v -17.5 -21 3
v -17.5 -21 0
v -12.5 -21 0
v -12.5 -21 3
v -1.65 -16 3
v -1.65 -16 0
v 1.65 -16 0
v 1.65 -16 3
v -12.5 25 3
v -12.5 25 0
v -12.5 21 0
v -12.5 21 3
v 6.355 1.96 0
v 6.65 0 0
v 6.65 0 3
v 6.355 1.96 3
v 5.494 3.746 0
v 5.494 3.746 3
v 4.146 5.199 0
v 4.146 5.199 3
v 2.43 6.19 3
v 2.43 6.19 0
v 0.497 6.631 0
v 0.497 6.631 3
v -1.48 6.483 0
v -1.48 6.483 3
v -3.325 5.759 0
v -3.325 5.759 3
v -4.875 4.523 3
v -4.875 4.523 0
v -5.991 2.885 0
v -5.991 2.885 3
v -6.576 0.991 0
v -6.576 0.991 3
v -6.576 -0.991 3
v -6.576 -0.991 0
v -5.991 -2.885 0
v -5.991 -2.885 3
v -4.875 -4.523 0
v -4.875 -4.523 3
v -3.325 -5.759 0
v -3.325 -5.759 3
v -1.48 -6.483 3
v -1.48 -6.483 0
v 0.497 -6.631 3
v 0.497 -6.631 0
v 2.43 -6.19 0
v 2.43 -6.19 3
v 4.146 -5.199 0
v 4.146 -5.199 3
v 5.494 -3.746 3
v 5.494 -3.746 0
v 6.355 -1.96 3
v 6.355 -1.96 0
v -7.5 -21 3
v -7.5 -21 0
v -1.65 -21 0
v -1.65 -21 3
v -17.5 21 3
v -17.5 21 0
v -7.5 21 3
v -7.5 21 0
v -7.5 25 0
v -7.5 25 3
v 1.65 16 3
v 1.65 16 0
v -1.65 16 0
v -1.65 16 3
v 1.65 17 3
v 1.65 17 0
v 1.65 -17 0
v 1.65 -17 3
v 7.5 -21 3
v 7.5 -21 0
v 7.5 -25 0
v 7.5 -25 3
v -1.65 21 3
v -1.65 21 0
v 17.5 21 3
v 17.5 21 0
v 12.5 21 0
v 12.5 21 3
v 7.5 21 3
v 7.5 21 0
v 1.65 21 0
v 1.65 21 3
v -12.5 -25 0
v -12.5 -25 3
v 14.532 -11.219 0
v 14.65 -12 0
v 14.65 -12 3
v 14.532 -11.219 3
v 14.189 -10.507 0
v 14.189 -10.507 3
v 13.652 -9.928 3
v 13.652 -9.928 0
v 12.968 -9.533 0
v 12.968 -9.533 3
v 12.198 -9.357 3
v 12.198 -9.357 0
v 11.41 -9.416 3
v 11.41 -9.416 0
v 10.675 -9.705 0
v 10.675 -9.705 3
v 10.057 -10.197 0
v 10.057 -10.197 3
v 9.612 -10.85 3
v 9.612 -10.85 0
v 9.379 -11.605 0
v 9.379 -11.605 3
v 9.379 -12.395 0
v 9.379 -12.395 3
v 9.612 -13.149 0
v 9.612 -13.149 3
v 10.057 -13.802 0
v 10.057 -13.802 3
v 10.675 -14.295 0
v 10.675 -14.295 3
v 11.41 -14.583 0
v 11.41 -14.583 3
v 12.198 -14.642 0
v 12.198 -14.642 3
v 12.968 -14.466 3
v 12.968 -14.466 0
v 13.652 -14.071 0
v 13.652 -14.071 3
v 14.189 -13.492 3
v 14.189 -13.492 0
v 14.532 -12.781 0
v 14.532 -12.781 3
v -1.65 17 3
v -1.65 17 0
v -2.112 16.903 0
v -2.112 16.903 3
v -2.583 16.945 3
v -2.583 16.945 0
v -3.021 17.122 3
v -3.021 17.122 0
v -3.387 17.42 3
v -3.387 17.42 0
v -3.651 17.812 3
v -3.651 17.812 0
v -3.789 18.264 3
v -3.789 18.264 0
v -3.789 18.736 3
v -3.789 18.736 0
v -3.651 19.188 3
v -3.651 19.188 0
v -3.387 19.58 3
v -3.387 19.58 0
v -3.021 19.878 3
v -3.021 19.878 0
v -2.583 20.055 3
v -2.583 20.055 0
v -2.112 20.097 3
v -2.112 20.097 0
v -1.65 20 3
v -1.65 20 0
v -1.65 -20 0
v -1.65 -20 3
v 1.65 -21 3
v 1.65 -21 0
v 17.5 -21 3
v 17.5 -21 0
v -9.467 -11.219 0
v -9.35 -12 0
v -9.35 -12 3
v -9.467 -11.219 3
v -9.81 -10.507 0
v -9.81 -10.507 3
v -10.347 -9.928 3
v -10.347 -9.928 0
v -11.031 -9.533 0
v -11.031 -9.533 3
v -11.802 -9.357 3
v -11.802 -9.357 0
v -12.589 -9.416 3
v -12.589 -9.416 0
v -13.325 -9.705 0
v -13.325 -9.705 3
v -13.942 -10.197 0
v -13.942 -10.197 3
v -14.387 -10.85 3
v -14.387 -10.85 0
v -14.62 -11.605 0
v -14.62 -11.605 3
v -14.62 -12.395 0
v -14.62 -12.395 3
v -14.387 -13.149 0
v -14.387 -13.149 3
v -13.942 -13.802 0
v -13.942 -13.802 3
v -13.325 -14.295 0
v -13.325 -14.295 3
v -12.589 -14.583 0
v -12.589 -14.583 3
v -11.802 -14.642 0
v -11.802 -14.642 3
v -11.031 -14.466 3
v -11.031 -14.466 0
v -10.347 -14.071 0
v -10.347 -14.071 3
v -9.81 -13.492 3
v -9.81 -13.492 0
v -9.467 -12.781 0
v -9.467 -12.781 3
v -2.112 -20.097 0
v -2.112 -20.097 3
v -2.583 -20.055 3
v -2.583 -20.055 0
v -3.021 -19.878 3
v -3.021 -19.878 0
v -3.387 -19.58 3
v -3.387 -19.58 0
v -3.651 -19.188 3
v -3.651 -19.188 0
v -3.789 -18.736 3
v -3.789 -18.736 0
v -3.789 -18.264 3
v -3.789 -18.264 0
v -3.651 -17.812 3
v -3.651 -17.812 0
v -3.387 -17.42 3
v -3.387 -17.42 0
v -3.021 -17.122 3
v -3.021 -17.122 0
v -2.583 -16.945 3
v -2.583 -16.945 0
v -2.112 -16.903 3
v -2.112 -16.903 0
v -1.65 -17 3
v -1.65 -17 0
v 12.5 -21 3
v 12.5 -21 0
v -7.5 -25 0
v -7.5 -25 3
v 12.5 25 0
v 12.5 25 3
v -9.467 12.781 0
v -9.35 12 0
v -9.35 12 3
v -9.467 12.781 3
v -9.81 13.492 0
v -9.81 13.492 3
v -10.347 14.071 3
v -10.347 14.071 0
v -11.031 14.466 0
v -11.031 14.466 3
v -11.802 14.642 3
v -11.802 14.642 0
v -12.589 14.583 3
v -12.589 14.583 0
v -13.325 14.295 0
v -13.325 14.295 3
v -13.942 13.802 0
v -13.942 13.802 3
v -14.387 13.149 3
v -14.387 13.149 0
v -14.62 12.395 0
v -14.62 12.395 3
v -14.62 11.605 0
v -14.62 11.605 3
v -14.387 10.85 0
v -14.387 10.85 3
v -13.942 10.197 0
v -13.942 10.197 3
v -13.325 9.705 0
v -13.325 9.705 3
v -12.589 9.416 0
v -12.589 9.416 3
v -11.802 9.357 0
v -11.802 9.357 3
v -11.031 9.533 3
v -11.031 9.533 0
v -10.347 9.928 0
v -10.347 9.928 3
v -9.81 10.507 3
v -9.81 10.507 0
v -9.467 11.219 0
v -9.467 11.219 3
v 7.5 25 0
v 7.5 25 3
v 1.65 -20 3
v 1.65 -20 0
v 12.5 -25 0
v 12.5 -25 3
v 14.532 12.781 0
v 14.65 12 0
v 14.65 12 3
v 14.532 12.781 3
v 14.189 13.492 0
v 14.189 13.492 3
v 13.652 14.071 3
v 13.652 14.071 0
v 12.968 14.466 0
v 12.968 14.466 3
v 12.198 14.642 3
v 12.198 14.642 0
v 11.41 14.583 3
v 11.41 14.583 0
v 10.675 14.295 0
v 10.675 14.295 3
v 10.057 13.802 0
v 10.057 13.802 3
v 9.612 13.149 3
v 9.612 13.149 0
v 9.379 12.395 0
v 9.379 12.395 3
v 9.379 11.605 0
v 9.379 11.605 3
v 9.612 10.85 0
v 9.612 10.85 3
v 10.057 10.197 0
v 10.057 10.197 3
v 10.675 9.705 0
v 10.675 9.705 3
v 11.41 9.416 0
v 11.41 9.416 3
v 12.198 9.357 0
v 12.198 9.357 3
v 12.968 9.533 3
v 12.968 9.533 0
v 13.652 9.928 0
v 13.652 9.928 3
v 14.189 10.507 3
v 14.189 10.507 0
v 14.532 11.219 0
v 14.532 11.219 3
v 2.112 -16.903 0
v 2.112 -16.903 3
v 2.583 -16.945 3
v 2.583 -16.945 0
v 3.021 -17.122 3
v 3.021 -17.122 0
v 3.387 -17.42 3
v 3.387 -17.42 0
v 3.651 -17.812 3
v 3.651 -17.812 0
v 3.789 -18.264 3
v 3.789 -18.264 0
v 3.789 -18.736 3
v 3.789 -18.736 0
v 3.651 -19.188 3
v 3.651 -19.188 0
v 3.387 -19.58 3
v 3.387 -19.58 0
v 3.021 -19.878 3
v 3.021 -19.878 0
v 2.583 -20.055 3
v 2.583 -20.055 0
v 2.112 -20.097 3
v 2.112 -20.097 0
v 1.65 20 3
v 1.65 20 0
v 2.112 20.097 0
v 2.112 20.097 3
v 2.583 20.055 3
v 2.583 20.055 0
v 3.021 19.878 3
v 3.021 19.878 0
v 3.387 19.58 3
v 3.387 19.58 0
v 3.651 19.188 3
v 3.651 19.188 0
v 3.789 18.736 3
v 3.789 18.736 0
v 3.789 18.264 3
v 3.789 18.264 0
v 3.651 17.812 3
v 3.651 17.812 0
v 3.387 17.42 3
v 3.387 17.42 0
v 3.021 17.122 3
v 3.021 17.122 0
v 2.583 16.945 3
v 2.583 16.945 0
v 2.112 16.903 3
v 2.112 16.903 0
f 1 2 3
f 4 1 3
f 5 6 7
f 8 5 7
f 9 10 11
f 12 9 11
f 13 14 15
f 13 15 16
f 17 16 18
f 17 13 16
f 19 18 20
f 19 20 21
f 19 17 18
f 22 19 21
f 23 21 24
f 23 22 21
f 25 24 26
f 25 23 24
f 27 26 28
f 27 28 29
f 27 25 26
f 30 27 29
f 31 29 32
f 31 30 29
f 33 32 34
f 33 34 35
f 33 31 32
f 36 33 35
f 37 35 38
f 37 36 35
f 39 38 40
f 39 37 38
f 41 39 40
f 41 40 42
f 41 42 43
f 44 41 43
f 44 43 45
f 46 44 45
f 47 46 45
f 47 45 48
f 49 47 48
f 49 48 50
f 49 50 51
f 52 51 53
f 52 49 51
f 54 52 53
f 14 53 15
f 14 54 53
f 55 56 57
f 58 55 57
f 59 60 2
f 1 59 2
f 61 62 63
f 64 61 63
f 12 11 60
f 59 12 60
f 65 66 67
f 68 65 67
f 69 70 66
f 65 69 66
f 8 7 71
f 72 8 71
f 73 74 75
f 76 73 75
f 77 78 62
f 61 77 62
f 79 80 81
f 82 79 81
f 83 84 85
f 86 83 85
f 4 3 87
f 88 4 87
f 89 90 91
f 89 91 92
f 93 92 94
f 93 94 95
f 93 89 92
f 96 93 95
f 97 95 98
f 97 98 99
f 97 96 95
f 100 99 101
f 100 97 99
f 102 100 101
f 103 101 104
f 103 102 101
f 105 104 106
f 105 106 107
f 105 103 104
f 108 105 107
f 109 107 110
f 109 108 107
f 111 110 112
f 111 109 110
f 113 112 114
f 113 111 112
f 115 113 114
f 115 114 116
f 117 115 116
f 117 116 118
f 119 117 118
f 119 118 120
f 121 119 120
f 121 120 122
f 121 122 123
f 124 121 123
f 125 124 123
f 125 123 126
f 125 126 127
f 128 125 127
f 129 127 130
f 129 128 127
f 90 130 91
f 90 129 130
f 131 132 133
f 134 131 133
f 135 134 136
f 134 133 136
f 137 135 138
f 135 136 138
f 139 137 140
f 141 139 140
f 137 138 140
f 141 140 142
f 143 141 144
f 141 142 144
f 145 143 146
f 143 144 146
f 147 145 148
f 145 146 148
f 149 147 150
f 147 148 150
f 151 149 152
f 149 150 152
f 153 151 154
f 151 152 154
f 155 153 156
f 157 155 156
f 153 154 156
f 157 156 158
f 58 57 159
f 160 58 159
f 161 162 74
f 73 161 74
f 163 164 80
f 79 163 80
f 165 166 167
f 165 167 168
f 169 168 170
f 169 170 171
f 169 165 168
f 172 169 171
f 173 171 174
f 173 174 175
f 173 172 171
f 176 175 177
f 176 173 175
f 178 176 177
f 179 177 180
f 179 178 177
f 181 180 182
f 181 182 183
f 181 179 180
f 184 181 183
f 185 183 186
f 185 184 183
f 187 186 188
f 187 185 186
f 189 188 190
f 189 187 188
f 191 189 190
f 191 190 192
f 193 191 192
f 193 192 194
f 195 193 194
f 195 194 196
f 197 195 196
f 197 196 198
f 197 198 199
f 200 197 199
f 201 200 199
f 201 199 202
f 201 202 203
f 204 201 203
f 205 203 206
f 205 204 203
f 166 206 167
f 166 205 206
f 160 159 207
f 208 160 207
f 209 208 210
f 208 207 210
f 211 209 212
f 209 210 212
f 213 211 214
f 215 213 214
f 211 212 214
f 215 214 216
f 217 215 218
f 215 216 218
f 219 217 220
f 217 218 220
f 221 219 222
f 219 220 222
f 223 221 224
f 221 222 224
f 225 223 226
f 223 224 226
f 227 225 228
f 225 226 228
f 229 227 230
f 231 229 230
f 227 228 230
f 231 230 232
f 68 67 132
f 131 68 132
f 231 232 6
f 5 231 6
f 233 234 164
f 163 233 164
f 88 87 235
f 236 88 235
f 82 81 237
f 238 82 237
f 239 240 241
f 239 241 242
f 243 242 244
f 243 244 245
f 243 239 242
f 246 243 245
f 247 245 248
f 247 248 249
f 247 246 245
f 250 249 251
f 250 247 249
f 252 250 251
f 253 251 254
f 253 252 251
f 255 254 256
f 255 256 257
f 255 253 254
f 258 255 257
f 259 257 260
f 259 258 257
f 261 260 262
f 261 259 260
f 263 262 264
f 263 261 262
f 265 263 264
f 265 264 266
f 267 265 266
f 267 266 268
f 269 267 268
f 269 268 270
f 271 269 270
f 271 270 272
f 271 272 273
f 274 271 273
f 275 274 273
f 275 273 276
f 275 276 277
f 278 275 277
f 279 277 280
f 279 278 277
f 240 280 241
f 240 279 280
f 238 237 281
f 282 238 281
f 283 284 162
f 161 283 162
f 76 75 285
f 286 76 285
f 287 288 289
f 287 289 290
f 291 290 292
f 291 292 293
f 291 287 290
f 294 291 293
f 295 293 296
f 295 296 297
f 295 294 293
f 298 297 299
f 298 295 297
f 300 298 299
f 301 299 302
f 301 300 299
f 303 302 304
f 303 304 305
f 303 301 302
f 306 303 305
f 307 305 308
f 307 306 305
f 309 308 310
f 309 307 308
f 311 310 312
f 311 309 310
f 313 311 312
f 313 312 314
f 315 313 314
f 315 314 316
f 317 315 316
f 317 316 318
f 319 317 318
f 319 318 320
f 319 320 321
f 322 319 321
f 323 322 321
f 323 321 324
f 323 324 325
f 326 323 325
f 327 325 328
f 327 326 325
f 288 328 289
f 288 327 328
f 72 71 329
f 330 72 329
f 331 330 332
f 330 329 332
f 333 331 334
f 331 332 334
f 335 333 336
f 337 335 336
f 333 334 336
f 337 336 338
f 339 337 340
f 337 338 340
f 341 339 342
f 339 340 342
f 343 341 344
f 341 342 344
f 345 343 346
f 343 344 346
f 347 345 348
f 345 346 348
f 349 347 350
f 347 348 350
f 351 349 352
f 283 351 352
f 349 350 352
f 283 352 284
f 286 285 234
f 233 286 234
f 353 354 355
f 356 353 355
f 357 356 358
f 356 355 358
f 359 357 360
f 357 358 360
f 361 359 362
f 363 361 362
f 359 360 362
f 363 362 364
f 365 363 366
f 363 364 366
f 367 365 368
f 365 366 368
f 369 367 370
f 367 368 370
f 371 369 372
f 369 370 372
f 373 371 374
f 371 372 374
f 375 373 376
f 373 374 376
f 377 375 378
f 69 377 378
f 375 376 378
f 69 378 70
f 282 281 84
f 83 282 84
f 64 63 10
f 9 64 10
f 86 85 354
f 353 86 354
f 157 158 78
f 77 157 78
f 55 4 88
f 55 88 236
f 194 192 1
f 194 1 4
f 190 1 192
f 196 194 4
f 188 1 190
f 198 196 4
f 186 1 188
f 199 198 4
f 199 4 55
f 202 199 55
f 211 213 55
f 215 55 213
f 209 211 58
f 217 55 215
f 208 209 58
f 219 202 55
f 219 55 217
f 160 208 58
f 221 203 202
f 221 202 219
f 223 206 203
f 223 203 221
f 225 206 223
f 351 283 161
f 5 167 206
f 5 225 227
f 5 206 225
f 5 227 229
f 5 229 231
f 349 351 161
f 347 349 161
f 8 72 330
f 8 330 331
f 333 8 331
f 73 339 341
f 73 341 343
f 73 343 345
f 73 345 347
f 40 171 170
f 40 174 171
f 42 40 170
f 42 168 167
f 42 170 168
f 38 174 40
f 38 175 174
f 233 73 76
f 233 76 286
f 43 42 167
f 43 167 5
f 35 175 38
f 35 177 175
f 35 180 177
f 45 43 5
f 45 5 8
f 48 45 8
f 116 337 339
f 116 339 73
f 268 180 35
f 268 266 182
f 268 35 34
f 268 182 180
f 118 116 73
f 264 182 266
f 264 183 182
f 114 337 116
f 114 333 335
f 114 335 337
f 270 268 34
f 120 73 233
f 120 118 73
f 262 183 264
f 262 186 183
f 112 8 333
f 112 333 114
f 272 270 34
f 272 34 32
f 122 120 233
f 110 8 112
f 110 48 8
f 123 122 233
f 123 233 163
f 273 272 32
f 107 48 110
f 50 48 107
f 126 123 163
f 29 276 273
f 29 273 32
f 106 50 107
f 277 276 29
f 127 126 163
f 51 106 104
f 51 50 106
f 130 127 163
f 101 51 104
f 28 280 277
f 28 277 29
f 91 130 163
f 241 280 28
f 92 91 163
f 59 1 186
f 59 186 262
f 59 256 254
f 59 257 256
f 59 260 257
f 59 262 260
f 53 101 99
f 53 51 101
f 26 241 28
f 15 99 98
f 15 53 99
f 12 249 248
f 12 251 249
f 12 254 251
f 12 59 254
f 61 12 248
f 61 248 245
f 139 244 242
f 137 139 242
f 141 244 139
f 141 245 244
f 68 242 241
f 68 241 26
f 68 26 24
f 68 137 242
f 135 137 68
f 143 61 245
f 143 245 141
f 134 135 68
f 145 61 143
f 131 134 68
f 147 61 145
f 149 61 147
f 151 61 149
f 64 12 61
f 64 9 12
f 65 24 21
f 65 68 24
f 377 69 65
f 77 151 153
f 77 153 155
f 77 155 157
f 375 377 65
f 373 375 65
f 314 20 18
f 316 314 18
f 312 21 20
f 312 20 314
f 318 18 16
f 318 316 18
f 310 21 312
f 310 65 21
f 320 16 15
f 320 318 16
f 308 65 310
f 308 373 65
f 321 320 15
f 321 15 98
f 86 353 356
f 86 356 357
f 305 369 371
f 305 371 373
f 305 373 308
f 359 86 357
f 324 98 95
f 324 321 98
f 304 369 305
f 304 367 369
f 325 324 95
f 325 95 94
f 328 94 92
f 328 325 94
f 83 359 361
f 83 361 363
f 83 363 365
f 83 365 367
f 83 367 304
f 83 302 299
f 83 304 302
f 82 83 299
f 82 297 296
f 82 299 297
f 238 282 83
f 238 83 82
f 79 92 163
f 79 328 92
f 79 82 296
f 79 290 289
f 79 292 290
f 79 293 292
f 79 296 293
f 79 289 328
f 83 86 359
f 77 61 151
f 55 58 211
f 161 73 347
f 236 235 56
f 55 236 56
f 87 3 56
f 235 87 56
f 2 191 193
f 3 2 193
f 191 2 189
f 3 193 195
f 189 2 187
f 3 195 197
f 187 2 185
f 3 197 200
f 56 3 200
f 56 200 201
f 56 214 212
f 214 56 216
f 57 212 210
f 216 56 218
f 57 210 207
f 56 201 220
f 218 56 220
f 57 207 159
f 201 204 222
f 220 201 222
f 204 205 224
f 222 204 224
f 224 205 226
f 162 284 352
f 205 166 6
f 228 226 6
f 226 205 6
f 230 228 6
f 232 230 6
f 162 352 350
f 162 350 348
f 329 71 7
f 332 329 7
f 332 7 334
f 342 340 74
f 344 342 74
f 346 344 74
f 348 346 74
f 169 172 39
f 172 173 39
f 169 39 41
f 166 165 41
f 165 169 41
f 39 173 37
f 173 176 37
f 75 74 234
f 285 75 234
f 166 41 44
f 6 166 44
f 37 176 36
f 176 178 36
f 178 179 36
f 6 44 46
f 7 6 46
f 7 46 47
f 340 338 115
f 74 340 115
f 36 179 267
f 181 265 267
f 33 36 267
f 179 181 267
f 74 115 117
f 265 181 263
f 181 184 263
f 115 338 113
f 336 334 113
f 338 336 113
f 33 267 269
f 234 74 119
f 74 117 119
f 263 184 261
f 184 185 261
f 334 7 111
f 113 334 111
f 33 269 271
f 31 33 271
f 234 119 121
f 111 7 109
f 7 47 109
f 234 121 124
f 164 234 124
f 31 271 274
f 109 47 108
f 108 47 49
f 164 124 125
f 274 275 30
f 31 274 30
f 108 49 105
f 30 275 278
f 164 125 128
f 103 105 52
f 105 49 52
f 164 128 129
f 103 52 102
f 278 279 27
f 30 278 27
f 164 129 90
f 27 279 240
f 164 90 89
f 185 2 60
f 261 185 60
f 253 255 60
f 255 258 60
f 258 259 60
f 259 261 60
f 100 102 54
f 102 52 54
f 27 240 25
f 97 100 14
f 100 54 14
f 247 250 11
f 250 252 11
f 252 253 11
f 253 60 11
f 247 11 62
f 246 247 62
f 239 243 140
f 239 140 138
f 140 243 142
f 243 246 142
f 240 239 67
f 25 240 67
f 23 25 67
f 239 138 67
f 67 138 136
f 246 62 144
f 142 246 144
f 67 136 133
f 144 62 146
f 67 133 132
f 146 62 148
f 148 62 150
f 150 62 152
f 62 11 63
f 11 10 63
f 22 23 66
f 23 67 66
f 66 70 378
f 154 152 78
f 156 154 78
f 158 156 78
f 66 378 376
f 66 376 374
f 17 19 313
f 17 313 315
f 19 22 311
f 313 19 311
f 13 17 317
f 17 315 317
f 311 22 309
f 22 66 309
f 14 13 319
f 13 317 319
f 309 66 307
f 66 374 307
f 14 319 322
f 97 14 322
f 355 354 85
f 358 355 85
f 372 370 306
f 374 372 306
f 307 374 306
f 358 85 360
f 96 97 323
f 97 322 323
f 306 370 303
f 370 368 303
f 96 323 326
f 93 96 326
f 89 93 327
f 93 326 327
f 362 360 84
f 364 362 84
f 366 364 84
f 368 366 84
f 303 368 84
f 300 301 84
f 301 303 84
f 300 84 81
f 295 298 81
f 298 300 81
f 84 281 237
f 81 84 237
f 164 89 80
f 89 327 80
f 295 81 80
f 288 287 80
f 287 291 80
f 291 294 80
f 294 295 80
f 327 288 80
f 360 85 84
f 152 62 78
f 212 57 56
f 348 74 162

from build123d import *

# Parameters (mm, degrees)
SKETCH_1_R      = 6.65
SKETCH_1_R_2    = 2.65
EXTRUDE_1_DEPTH = 3


with BuildPart() as part:
    # 草图1 → 凸台-拉伸1 (new body)
    with BuildSketch(Plane.XY):
        with BuildLine():
            Line((17.5, -21), (17.5, 21))
            Line((17.5, 21), (12.5, 21))
            Line((12.5, 21), (12.5, 25))
            Line((12.5, 25), (7.5, 25))
            Line((7.5, 25), (7.5, 21))
            Line((7.5, 21), (1.65, 21))
            Line((1.65, 21), (1.65, 20))
            ThreePointArc((1.65, 20), (3.806776436, 18.5), (1.65, 17))
            Line((1.65, 17), (1.65, 16))
            Line((1.65, 16), (-1.65, 16))
            Line((-1.65, 16), (-1.65, 17))
            ThreePointArc((-1.65, 17), (-3.806776436, 18.5), (-1.65, 20))
            Line((-1.65, 20), (-1.65, 21))
            Line((-1.65, 21), (-7.5, 21))
            Line((-7.5, 21), (-7.5, 25))
            Line((-7.5, 25), (-12.5, 25))
            Line((-12.5, 25), (-12.5, 21))
            Line((-12.5, 21), (-17.5, 21))
            Line((-17.5, 21), (-17.5, -21))
            Line((-17.5, -21), (-12.5, -21))
            Line((-12.5, -21), (-12.5, -25))
            Line((-12.5, -25), (-7.5, -25))
            Line((-7.5, -25), (-7.5, -21))
            Line((-7.5, -21), (-1.65, -21))
            Line((-1.65, -21), (-1.65, -20))
            ThreePointArc((-1.65, -20), (-3.806776436, -18.5), (-1.65, -17))
            Line((-1.65, -17), (-1.65, -16))
            Line((-1.65, -16), (1.65, -16))
            Line((1.65, -16), (1.65, -17))
            ThreePointArc((1.65, -17), (3.806776436, -18.5), (1.65, -20))
            Line((1.65, -20), (1.65, -21))
            Line((1.65, -21), (7.5, -21))
            Line((7.5, -21), (7.5, -25))
            Line((7.5, -25), (12.5, -25))
            Line((12.5, -25), (12.5, -21))
            Line((12.5, -21), (17.5, -21))
        make_face()
        Circle(SKETCH_1_R, mode=Mode.SUBTRACT)
        with Locations((11.999602077, -11.999602077)):
            Circle(SKETCH_1_R_2, mode=Mode.SUBTRACT)
        with Locations((-11.999602077, -11.999602077)):
            Circle(SKETCH_1_R_2, mode=Mode.SUBTRACT)
        with Locations((-11.999602077, 11.999602077)):
            Circle(SKETCH_1_R_2, mode=Mode.SUBTRACT)
        with Locations((11.999602077, 11.999602077)):
            Circle(SKETCH_1_R_2, mode=Mode.SUBTRACT)
    extrude(amount=EXTRUDE_1_DEPTH)


solid = part.part
